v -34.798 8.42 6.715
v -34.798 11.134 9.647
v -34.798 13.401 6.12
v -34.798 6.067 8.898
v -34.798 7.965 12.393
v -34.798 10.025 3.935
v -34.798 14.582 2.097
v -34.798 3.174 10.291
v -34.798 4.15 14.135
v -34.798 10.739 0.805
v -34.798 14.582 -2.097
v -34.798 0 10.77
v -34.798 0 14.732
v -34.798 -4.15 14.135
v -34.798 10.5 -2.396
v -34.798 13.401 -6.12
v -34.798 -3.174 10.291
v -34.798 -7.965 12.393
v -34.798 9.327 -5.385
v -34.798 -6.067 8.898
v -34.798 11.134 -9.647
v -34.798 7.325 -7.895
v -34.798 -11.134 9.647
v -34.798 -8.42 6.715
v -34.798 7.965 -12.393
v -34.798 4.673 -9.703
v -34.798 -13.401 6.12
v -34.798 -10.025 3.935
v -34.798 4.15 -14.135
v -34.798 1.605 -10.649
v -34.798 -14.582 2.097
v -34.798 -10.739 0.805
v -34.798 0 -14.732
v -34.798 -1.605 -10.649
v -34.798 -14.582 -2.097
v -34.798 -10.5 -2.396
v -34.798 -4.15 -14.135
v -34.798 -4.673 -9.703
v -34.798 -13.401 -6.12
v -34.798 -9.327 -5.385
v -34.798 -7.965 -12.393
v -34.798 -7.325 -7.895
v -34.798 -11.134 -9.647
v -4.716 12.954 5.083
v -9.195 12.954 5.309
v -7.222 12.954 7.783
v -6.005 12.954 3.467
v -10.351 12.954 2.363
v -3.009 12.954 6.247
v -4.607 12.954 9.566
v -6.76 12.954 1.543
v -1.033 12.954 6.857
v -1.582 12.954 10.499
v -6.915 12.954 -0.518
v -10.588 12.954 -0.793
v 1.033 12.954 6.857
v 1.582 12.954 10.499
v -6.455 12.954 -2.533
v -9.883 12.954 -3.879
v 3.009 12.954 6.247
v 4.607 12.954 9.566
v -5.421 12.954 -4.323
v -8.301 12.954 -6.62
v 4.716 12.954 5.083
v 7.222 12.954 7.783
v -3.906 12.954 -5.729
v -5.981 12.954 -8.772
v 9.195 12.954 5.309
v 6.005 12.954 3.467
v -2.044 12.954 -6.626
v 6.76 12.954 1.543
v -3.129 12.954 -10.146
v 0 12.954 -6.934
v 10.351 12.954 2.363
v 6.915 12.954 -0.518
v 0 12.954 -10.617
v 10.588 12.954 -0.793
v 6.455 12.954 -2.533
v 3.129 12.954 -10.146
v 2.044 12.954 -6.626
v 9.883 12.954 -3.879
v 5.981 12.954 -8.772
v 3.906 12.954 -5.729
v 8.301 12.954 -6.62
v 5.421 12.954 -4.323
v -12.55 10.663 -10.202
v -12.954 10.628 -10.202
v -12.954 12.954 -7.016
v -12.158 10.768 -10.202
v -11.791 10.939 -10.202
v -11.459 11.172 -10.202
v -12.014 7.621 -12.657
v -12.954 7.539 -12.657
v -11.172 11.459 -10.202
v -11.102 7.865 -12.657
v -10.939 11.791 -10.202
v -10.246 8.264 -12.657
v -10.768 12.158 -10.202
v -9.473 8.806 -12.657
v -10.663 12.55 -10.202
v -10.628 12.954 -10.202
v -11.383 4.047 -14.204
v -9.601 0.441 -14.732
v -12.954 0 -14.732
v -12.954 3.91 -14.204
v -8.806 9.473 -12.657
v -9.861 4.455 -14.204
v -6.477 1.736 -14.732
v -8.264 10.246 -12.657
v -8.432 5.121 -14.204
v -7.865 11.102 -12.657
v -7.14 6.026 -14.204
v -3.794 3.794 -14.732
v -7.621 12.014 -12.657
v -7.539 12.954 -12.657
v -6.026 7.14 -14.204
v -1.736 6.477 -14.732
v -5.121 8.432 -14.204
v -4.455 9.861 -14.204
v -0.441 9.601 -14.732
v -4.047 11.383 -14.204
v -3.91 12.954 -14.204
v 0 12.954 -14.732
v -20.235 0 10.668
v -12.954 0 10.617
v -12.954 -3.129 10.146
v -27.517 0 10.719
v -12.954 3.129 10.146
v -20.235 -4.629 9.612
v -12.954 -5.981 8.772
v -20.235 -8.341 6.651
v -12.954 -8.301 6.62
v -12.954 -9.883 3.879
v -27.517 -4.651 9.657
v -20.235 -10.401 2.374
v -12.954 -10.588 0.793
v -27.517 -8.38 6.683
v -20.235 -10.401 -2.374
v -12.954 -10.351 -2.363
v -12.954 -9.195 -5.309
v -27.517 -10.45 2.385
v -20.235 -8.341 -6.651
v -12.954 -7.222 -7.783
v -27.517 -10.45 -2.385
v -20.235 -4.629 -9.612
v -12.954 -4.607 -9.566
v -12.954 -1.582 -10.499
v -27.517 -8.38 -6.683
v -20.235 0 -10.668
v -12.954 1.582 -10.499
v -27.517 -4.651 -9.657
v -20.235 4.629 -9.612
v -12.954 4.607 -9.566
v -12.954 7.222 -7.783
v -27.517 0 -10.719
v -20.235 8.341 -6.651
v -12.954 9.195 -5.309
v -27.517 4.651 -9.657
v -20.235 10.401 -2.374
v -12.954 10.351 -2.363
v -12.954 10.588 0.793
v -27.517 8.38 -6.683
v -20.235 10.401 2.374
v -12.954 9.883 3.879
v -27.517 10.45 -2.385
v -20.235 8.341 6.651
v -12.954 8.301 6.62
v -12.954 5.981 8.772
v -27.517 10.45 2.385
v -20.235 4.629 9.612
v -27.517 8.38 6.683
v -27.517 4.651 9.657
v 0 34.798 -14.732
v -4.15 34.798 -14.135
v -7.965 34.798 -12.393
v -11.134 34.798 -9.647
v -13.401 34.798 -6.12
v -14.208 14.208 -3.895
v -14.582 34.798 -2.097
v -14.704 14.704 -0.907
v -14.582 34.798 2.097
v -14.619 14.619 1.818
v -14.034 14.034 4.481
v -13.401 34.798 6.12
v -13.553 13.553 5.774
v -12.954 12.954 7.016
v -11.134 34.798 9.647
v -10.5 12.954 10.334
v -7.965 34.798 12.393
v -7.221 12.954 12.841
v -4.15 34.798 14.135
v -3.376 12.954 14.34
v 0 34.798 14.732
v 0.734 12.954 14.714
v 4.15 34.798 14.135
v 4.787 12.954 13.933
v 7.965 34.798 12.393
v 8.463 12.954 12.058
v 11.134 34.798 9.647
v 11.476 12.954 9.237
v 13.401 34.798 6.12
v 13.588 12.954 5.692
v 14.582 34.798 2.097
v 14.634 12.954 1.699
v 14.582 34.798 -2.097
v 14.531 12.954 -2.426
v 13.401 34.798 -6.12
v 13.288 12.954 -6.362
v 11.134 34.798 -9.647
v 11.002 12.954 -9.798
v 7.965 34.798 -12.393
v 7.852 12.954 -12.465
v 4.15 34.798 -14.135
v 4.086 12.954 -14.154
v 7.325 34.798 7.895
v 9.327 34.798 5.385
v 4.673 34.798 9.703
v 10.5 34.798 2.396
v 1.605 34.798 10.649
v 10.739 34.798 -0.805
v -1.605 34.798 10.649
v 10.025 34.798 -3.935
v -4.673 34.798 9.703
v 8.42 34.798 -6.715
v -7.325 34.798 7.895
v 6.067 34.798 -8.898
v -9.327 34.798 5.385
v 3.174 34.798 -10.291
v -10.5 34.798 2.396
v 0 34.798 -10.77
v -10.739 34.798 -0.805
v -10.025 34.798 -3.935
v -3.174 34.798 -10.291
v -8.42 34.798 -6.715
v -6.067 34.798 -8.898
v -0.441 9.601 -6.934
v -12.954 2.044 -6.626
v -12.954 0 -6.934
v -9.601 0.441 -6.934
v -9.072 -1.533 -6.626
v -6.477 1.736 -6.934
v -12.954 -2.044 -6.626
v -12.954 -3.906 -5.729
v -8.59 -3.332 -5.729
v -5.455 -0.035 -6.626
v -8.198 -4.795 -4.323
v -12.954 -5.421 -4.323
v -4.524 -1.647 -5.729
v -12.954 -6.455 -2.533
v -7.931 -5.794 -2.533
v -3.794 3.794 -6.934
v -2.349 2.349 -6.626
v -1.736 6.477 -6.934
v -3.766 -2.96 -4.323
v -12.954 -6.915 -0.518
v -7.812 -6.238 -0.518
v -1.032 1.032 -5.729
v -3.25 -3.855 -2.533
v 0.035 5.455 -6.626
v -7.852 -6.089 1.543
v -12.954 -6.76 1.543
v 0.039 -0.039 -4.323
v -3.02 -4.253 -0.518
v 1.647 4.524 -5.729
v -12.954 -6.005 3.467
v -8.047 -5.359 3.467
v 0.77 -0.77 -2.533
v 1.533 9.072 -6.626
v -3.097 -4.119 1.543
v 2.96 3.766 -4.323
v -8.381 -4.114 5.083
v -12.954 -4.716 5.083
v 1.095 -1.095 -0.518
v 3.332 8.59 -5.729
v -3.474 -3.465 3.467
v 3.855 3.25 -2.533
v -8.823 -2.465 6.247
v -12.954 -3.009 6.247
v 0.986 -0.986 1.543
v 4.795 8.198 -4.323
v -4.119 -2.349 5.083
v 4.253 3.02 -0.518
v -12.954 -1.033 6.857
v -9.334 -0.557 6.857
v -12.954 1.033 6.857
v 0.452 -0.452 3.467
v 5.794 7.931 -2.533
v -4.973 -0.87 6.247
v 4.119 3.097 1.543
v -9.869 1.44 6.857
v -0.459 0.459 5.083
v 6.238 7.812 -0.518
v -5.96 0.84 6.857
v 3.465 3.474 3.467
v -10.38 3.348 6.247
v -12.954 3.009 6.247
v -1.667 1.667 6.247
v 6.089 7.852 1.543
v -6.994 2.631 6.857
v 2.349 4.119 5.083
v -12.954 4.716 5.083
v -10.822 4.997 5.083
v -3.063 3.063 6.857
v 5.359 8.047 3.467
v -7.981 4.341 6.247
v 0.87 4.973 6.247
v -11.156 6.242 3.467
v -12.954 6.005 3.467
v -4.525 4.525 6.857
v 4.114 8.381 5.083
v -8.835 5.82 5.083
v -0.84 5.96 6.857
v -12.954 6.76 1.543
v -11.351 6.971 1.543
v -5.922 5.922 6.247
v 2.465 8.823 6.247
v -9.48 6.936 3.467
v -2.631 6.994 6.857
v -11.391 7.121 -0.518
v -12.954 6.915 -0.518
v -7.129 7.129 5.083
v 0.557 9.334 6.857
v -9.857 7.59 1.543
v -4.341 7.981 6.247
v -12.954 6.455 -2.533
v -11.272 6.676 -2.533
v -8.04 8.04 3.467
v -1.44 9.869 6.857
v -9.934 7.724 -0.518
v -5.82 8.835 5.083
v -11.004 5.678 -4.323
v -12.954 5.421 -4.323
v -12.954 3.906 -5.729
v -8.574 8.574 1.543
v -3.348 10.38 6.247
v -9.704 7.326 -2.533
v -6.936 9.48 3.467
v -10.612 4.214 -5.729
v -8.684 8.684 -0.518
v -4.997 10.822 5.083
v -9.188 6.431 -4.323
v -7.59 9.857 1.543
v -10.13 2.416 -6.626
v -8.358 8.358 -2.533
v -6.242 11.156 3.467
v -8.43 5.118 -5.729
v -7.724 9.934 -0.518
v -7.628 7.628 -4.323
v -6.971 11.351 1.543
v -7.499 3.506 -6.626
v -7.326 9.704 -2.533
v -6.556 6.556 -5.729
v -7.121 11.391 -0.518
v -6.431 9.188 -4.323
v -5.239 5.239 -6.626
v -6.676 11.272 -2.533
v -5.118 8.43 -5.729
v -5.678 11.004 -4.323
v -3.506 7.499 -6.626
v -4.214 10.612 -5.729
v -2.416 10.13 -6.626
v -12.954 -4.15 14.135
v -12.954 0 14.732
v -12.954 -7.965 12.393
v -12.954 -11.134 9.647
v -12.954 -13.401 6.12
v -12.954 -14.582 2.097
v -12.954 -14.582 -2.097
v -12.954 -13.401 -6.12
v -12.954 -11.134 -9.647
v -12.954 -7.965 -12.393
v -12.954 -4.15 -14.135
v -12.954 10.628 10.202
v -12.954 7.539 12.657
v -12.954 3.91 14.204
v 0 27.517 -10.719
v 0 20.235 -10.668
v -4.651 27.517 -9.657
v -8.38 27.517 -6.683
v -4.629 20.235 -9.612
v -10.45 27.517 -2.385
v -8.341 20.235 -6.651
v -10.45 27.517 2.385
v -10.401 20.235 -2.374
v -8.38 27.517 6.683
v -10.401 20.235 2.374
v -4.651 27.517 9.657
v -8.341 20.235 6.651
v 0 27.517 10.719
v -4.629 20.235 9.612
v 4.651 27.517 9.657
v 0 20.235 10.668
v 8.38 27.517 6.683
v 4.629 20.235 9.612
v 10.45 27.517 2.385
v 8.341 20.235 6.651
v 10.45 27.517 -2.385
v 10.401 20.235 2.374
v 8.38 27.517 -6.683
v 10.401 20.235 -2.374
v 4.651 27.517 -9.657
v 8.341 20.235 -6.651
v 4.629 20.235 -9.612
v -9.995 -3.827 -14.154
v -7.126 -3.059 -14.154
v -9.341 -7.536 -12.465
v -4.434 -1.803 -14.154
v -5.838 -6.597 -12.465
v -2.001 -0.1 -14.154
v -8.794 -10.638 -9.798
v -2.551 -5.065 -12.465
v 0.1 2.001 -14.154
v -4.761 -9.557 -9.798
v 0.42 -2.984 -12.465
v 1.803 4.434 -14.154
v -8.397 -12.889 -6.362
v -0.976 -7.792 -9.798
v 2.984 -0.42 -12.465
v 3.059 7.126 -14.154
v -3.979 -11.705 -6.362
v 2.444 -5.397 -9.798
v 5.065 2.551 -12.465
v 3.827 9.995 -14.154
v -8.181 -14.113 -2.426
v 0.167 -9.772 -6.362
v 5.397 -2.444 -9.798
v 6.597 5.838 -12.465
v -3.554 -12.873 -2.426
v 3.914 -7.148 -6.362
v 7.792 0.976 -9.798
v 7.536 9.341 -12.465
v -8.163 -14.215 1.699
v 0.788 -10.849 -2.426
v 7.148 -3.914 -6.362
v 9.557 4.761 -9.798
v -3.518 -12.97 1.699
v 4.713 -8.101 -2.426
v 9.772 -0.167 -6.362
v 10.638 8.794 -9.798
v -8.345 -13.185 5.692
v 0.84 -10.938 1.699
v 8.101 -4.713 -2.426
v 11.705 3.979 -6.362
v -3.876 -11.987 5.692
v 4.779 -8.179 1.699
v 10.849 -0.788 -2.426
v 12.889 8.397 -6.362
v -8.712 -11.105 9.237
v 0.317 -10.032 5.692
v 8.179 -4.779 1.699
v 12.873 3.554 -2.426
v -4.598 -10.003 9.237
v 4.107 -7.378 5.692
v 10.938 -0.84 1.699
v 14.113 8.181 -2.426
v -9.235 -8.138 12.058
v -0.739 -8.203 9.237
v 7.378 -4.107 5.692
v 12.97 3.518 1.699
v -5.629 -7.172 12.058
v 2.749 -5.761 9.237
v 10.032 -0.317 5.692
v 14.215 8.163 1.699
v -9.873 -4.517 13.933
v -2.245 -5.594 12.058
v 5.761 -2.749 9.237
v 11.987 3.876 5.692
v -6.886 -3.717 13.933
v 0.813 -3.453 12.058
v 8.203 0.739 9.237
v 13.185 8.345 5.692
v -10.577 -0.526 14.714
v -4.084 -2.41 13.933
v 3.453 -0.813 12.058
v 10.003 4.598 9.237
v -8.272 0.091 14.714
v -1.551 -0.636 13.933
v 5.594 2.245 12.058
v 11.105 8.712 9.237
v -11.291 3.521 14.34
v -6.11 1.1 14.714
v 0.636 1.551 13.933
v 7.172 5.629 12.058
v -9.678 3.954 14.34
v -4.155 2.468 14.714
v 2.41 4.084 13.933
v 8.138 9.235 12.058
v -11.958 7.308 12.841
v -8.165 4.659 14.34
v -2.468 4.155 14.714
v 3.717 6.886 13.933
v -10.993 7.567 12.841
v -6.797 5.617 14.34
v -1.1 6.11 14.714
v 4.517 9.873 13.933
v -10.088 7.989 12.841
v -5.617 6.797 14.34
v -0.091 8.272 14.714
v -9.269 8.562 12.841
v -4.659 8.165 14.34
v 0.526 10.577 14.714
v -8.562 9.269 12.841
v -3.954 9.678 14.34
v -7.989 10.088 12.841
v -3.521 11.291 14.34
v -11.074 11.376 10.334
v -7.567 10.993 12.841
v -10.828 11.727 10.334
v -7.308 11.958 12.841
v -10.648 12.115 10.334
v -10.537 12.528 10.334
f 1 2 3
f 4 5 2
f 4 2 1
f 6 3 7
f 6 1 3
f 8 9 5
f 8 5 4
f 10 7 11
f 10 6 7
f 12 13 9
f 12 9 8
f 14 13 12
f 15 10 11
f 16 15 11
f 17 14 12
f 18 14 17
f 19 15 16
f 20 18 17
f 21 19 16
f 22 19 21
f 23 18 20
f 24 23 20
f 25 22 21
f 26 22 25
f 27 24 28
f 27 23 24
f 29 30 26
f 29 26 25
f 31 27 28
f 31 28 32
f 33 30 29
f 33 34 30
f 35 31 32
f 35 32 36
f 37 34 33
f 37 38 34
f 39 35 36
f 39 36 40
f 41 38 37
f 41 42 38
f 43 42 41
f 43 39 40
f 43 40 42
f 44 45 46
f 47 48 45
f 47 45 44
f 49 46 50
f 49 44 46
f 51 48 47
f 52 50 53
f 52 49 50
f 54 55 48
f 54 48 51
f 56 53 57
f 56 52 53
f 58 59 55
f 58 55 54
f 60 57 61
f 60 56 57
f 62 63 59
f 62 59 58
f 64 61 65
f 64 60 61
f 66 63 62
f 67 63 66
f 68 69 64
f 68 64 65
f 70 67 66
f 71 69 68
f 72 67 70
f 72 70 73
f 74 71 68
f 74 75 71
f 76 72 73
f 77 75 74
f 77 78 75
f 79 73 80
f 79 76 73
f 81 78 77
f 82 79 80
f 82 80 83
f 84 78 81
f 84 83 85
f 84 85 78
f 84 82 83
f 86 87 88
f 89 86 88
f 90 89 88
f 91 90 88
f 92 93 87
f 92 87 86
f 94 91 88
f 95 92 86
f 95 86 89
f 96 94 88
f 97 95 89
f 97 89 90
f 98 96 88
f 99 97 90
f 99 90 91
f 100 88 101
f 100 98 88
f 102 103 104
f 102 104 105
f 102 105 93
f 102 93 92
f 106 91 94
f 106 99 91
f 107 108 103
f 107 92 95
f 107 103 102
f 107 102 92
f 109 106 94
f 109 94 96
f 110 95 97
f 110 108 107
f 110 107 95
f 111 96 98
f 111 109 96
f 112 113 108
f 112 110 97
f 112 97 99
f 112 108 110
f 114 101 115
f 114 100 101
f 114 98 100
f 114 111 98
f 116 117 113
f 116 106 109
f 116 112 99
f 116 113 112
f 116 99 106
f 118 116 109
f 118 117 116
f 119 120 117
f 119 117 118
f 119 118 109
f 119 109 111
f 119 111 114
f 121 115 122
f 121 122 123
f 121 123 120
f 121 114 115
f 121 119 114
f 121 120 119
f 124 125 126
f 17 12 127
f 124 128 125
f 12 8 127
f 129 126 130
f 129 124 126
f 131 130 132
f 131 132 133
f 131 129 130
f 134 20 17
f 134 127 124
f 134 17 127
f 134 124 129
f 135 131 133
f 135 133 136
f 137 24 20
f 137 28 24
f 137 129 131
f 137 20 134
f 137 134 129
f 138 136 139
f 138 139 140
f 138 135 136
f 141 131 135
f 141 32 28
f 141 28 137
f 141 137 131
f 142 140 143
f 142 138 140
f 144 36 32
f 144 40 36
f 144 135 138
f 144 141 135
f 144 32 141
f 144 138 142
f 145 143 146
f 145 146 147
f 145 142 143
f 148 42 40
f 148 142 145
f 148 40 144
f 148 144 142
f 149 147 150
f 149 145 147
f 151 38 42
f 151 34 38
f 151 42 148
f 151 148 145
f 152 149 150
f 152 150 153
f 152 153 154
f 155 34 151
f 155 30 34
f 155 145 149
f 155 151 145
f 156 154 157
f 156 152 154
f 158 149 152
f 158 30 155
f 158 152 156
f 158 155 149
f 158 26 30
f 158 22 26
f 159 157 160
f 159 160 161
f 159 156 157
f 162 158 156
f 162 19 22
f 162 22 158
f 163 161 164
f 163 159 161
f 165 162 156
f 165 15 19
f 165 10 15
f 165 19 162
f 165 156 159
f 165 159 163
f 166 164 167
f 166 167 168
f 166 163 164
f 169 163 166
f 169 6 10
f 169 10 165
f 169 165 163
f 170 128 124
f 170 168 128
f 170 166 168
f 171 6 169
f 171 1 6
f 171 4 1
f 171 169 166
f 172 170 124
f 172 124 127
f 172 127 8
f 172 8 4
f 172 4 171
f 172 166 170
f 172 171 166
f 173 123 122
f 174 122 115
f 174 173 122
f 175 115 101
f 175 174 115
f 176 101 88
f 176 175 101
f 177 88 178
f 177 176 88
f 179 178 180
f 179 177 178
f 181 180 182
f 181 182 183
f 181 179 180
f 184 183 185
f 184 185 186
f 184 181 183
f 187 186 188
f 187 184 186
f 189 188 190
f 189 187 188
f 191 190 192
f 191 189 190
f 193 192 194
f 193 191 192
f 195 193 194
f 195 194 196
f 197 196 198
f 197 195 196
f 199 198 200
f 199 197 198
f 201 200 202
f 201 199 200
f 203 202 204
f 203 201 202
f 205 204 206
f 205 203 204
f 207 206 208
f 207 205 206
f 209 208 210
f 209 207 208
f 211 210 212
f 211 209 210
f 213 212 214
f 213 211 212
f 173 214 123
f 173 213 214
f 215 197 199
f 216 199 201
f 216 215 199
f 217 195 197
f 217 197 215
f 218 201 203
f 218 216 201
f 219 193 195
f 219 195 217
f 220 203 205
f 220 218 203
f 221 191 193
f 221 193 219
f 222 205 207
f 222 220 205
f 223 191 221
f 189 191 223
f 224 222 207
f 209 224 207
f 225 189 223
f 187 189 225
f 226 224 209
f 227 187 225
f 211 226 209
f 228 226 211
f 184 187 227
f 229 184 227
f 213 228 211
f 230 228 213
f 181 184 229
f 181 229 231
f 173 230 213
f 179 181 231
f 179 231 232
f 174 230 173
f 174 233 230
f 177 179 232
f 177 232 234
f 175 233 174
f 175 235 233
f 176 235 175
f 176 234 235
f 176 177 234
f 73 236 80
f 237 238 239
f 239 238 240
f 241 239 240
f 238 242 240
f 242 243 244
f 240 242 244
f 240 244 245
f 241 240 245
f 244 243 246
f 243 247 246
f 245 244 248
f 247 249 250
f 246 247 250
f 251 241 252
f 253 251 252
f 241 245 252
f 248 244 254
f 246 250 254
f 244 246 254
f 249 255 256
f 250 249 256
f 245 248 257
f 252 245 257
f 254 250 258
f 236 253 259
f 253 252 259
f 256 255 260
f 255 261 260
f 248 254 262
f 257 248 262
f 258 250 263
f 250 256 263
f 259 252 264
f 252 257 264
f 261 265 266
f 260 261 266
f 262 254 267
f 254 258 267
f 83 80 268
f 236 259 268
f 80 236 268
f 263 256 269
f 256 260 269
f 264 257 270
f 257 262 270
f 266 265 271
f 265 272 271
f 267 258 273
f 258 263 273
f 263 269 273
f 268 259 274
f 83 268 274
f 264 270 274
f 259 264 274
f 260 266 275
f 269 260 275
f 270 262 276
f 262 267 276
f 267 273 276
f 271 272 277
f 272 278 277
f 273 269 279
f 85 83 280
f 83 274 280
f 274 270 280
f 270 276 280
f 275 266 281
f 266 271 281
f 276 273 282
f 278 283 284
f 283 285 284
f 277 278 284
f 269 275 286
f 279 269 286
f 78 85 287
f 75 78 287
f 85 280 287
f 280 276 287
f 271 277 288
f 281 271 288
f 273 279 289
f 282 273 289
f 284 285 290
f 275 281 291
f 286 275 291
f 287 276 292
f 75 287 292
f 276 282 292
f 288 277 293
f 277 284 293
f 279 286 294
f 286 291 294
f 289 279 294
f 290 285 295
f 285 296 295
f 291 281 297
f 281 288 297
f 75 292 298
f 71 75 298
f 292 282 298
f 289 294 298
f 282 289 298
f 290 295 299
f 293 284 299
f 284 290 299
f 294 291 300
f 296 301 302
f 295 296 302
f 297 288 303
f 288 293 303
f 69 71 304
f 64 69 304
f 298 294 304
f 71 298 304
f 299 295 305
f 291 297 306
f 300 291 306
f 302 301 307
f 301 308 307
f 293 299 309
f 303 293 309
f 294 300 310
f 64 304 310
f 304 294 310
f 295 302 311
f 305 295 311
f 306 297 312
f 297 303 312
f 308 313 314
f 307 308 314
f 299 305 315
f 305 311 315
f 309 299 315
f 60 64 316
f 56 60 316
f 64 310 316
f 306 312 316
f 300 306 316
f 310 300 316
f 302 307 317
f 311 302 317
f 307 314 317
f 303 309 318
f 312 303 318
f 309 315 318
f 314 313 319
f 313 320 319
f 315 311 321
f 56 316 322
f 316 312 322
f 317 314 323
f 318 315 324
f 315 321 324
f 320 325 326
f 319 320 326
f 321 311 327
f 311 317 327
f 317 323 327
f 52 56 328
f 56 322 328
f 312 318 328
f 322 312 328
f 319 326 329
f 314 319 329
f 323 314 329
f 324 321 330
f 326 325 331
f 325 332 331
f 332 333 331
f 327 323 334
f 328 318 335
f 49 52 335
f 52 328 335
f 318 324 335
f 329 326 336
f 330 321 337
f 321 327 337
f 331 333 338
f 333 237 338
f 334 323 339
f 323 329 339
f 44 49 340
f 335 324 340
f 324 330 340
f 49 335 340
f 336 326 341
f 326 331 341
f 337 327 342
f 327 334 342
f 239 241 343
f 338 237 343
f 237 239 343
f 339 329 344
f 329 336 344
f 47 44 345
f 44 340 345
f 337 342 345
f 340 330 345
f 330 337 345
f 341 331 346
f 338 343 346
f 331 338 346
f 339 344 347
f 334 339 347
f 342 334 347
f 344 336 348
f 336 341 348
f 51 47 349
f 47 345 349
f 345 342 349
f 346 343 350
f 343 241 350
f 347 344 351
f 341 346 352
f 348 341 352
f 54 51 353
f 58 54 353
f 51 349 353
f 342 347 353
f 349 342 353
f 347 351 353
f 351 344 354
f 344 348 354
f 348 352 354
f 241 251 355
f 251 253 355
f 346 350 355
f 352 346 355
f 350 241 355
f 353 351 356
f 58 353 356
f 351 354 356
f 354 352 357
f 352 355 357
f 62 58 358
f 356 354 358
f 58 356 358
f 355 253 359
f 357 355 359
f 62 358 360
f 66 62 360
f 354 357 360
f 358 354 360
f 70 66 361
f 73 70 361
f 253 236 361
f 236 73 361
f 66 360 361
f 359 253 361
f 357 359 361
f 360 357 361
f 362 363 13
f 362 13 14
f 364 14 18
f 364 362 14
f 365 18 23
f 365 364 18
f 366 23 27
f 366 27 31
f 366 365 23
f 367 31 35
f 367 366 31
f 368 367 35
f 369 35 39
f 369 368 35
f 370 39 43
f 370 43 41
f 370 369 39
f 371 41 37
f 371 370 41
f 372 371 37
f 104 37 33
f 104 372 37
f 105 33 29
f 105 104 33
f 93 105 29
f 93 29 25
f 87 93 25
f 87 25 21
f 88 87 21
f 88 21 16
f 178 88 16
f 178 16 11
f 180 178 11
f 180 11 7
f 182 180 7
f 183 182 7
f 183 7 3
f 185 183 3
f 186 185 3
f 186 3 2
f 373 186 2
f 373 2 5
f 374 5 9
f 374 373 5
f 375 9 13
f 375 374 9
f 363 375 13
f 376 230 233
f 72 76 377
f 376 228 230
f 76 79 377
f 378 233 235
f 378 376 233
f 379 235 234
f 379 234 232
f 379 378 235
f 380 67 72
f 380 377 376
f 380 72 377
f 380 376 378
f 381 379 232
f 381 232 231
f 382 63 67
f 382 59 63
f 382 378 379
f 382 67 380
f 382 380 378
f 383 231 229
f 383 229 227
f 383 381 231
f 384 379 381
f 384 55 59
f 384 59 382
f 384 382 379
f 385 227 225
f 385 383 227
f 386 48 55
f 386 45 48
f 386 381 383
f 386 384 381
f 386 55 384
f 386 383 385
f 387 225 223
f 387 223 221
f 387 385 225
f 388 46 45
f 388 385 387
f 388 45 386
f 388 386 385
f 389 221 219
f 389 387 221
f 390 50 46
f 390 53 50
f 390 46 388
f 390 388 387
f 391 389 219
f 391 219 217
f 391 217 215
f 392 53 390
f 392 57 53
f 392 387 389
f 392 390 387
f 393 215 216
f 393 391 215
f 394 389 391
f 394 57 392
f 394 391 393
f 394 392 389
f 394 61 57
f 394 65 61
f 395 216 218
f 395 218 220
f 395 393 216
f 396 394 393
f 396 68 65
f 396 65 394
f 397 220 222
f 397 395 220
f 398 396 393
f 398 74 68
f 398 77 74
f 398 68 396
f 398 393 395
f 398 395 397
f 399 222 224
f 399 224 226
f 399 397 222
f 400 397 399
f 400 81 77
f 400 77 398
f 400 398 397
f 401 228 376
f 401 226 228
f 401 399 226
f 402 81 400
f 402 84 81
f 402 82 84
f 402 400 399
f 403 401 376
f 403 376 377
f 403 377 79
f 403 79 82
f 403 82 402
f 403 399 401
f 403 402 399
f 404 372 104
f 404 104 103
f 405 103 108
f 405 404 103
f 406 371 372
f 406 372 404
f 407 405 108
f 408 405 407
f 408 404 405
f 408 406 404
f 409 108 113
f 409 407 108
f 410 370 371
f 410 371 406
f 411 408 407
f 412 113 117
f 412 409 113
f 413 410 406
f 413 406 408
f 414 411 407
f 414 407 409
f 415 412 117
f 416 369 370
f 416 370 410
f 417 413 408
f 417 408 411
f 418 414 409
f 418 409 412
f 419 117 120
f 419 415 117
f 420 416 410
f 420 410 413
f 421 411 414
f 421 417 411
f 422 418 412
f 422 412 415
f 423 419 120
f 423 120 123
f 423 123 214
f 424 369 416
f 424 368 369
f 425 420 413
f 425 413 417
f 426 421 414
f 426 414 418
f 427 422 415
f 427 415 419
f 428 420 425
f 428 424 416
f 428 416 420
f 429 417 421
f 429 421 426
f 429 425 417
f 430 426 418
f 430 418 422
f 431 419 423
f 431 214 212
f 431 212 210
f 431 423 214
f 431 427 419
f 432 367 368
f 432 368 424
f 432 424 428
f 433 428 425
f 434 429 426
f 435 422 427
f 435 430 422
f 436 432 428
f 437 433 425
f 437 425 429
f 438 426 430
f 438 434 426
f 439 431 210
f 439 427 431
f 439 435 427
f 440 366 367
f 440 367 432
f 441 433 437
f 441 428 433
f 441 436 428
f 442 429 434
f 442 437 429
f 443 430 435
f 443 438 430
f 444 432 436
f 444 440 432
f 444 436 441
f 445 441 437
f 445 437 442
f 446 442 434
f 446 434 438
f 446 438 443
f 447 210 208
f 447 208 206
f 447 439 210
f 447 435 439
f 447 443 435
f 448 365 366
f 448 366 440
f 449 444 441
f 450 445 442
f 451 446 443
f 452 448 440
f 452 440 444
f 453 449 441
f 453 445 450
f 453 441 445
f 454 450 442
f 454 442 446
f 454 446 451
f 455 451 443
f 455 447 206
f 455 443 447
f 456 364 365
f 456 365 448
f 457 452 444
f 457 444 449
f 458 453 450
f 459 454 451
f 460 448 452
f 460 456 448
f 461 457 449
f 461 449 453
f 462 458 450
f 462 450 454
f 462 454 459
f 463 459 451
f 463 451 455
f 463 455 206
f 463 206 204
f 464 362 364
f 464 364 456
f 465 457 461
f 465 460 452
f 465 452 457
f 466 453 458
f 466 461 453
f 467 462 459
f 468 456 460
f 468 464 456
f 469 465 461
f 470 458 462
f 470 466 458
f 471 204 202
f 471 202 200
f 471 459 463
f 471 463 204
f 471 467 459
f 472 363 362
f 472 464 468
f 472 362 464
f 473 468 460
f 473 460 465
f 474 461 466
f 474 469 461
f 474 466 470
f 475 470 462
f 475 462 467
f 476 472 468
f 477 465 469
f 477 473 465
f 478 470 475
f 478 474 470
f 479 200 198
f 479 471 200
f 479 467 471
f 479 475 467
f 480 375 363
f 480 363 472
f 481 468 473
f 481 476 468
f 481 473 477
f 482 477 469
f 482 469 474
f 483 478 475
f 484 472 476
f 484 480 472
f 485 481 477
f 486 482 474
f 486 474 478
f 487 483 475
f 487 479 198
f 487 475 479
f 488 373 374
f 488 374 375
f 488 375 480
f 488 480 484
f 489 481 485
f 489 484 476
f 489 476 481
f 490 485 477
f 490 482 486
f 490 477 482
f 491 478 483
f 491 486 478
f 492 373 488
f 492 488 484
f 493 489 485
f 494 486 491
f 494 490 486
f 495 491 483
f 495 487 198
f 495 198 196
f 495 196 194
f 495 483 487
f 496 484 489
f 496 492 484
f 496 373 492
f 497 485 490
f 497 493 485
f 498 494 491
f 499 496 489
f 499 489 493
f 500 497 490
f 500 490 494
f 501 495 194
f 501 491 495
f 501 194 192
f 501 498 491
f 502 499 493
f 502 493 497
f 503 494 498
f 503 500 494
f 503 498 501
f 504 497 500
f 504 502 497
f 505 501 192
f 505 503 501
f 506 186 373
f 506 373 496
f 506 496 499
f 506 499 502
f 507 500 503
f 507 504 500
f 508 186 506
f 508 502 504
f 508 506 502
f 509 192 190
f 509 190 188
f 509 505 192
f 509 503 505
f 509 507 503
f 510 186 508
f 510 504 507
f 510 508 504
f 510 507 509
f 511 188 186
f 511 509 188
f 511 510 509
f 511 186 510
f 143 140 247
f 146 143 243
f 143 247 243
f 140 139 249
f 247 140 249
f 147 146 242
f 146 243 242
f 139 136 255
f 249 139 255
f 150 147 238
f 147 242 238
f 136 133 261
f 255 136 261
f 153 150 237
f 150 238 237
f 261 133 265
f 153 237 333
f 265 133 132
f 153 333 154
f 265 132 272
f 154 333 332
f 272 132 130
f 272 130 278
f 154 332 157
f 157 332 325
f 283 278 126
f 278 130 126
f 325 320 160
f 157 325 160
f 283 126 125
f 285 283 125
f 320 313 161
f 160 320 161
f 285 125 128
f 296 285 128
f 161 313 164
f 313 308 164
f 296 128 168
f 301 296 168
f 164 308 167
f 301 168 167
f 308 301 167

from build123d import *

# Parameters (mm, degrees)
SKETCH3_R   = 14.732
SKETCH3_R_2 = 6.9342


with BuildPart() as part:
    # Sketch1 → Revolve1 (revolve)
    with BuildSketch(Plane.XY):
        Polygon((-34.798, -14.732), (-12.954, -14.732), (-12.954, -10.6172), (-34.798, -10.7696), align=None)
    revolve(axis=Axis((-34.798, 0, 0), (1, 0, 0)))


with BuildPart() as body_2:
    # Sketch2 → Revolve2 (revolve)
    with BuildSketch(Plane.XY):
        Polygon((10.7696, 34.798), (10.6172, 12.954), (14.732, 12.954), (14.732, 34.798), align=None)
    revolve(axis=Axis((0, 0, 0), (0, 1, 0)))


with BuildPart() as sweep1_tool:
    # Sweep1: sweep along a path in Sketch4
    with BuildLine(Plane.XY) as sweep1_path:
        ThreePointArc((-12.954, 0), (-3.794139, 3.794139), (0, 12.954))
    # Sketch3 → Sweep1 (sweep)
    with BuildSketch(Plane(origin=(-12.954, 0, 0), x_dir=(0, 0, -1), z_dir=(1, 0, 0))):
        Circle(SKETCH3_R)
        Circle(SKETCH3_R_2, mode=Mode.SUBTRACT)
    sweep(path=sweep1_path.line)


with BuildPart() as part_1:
    add(part.part)


with BuildPart() as part_2:
    # Sweep1: joined with sweep1_tool
    add(part_1.part.fuse(sweep1_tool.part, body_2.part, tol=0.00001))


solid = part_2.part
